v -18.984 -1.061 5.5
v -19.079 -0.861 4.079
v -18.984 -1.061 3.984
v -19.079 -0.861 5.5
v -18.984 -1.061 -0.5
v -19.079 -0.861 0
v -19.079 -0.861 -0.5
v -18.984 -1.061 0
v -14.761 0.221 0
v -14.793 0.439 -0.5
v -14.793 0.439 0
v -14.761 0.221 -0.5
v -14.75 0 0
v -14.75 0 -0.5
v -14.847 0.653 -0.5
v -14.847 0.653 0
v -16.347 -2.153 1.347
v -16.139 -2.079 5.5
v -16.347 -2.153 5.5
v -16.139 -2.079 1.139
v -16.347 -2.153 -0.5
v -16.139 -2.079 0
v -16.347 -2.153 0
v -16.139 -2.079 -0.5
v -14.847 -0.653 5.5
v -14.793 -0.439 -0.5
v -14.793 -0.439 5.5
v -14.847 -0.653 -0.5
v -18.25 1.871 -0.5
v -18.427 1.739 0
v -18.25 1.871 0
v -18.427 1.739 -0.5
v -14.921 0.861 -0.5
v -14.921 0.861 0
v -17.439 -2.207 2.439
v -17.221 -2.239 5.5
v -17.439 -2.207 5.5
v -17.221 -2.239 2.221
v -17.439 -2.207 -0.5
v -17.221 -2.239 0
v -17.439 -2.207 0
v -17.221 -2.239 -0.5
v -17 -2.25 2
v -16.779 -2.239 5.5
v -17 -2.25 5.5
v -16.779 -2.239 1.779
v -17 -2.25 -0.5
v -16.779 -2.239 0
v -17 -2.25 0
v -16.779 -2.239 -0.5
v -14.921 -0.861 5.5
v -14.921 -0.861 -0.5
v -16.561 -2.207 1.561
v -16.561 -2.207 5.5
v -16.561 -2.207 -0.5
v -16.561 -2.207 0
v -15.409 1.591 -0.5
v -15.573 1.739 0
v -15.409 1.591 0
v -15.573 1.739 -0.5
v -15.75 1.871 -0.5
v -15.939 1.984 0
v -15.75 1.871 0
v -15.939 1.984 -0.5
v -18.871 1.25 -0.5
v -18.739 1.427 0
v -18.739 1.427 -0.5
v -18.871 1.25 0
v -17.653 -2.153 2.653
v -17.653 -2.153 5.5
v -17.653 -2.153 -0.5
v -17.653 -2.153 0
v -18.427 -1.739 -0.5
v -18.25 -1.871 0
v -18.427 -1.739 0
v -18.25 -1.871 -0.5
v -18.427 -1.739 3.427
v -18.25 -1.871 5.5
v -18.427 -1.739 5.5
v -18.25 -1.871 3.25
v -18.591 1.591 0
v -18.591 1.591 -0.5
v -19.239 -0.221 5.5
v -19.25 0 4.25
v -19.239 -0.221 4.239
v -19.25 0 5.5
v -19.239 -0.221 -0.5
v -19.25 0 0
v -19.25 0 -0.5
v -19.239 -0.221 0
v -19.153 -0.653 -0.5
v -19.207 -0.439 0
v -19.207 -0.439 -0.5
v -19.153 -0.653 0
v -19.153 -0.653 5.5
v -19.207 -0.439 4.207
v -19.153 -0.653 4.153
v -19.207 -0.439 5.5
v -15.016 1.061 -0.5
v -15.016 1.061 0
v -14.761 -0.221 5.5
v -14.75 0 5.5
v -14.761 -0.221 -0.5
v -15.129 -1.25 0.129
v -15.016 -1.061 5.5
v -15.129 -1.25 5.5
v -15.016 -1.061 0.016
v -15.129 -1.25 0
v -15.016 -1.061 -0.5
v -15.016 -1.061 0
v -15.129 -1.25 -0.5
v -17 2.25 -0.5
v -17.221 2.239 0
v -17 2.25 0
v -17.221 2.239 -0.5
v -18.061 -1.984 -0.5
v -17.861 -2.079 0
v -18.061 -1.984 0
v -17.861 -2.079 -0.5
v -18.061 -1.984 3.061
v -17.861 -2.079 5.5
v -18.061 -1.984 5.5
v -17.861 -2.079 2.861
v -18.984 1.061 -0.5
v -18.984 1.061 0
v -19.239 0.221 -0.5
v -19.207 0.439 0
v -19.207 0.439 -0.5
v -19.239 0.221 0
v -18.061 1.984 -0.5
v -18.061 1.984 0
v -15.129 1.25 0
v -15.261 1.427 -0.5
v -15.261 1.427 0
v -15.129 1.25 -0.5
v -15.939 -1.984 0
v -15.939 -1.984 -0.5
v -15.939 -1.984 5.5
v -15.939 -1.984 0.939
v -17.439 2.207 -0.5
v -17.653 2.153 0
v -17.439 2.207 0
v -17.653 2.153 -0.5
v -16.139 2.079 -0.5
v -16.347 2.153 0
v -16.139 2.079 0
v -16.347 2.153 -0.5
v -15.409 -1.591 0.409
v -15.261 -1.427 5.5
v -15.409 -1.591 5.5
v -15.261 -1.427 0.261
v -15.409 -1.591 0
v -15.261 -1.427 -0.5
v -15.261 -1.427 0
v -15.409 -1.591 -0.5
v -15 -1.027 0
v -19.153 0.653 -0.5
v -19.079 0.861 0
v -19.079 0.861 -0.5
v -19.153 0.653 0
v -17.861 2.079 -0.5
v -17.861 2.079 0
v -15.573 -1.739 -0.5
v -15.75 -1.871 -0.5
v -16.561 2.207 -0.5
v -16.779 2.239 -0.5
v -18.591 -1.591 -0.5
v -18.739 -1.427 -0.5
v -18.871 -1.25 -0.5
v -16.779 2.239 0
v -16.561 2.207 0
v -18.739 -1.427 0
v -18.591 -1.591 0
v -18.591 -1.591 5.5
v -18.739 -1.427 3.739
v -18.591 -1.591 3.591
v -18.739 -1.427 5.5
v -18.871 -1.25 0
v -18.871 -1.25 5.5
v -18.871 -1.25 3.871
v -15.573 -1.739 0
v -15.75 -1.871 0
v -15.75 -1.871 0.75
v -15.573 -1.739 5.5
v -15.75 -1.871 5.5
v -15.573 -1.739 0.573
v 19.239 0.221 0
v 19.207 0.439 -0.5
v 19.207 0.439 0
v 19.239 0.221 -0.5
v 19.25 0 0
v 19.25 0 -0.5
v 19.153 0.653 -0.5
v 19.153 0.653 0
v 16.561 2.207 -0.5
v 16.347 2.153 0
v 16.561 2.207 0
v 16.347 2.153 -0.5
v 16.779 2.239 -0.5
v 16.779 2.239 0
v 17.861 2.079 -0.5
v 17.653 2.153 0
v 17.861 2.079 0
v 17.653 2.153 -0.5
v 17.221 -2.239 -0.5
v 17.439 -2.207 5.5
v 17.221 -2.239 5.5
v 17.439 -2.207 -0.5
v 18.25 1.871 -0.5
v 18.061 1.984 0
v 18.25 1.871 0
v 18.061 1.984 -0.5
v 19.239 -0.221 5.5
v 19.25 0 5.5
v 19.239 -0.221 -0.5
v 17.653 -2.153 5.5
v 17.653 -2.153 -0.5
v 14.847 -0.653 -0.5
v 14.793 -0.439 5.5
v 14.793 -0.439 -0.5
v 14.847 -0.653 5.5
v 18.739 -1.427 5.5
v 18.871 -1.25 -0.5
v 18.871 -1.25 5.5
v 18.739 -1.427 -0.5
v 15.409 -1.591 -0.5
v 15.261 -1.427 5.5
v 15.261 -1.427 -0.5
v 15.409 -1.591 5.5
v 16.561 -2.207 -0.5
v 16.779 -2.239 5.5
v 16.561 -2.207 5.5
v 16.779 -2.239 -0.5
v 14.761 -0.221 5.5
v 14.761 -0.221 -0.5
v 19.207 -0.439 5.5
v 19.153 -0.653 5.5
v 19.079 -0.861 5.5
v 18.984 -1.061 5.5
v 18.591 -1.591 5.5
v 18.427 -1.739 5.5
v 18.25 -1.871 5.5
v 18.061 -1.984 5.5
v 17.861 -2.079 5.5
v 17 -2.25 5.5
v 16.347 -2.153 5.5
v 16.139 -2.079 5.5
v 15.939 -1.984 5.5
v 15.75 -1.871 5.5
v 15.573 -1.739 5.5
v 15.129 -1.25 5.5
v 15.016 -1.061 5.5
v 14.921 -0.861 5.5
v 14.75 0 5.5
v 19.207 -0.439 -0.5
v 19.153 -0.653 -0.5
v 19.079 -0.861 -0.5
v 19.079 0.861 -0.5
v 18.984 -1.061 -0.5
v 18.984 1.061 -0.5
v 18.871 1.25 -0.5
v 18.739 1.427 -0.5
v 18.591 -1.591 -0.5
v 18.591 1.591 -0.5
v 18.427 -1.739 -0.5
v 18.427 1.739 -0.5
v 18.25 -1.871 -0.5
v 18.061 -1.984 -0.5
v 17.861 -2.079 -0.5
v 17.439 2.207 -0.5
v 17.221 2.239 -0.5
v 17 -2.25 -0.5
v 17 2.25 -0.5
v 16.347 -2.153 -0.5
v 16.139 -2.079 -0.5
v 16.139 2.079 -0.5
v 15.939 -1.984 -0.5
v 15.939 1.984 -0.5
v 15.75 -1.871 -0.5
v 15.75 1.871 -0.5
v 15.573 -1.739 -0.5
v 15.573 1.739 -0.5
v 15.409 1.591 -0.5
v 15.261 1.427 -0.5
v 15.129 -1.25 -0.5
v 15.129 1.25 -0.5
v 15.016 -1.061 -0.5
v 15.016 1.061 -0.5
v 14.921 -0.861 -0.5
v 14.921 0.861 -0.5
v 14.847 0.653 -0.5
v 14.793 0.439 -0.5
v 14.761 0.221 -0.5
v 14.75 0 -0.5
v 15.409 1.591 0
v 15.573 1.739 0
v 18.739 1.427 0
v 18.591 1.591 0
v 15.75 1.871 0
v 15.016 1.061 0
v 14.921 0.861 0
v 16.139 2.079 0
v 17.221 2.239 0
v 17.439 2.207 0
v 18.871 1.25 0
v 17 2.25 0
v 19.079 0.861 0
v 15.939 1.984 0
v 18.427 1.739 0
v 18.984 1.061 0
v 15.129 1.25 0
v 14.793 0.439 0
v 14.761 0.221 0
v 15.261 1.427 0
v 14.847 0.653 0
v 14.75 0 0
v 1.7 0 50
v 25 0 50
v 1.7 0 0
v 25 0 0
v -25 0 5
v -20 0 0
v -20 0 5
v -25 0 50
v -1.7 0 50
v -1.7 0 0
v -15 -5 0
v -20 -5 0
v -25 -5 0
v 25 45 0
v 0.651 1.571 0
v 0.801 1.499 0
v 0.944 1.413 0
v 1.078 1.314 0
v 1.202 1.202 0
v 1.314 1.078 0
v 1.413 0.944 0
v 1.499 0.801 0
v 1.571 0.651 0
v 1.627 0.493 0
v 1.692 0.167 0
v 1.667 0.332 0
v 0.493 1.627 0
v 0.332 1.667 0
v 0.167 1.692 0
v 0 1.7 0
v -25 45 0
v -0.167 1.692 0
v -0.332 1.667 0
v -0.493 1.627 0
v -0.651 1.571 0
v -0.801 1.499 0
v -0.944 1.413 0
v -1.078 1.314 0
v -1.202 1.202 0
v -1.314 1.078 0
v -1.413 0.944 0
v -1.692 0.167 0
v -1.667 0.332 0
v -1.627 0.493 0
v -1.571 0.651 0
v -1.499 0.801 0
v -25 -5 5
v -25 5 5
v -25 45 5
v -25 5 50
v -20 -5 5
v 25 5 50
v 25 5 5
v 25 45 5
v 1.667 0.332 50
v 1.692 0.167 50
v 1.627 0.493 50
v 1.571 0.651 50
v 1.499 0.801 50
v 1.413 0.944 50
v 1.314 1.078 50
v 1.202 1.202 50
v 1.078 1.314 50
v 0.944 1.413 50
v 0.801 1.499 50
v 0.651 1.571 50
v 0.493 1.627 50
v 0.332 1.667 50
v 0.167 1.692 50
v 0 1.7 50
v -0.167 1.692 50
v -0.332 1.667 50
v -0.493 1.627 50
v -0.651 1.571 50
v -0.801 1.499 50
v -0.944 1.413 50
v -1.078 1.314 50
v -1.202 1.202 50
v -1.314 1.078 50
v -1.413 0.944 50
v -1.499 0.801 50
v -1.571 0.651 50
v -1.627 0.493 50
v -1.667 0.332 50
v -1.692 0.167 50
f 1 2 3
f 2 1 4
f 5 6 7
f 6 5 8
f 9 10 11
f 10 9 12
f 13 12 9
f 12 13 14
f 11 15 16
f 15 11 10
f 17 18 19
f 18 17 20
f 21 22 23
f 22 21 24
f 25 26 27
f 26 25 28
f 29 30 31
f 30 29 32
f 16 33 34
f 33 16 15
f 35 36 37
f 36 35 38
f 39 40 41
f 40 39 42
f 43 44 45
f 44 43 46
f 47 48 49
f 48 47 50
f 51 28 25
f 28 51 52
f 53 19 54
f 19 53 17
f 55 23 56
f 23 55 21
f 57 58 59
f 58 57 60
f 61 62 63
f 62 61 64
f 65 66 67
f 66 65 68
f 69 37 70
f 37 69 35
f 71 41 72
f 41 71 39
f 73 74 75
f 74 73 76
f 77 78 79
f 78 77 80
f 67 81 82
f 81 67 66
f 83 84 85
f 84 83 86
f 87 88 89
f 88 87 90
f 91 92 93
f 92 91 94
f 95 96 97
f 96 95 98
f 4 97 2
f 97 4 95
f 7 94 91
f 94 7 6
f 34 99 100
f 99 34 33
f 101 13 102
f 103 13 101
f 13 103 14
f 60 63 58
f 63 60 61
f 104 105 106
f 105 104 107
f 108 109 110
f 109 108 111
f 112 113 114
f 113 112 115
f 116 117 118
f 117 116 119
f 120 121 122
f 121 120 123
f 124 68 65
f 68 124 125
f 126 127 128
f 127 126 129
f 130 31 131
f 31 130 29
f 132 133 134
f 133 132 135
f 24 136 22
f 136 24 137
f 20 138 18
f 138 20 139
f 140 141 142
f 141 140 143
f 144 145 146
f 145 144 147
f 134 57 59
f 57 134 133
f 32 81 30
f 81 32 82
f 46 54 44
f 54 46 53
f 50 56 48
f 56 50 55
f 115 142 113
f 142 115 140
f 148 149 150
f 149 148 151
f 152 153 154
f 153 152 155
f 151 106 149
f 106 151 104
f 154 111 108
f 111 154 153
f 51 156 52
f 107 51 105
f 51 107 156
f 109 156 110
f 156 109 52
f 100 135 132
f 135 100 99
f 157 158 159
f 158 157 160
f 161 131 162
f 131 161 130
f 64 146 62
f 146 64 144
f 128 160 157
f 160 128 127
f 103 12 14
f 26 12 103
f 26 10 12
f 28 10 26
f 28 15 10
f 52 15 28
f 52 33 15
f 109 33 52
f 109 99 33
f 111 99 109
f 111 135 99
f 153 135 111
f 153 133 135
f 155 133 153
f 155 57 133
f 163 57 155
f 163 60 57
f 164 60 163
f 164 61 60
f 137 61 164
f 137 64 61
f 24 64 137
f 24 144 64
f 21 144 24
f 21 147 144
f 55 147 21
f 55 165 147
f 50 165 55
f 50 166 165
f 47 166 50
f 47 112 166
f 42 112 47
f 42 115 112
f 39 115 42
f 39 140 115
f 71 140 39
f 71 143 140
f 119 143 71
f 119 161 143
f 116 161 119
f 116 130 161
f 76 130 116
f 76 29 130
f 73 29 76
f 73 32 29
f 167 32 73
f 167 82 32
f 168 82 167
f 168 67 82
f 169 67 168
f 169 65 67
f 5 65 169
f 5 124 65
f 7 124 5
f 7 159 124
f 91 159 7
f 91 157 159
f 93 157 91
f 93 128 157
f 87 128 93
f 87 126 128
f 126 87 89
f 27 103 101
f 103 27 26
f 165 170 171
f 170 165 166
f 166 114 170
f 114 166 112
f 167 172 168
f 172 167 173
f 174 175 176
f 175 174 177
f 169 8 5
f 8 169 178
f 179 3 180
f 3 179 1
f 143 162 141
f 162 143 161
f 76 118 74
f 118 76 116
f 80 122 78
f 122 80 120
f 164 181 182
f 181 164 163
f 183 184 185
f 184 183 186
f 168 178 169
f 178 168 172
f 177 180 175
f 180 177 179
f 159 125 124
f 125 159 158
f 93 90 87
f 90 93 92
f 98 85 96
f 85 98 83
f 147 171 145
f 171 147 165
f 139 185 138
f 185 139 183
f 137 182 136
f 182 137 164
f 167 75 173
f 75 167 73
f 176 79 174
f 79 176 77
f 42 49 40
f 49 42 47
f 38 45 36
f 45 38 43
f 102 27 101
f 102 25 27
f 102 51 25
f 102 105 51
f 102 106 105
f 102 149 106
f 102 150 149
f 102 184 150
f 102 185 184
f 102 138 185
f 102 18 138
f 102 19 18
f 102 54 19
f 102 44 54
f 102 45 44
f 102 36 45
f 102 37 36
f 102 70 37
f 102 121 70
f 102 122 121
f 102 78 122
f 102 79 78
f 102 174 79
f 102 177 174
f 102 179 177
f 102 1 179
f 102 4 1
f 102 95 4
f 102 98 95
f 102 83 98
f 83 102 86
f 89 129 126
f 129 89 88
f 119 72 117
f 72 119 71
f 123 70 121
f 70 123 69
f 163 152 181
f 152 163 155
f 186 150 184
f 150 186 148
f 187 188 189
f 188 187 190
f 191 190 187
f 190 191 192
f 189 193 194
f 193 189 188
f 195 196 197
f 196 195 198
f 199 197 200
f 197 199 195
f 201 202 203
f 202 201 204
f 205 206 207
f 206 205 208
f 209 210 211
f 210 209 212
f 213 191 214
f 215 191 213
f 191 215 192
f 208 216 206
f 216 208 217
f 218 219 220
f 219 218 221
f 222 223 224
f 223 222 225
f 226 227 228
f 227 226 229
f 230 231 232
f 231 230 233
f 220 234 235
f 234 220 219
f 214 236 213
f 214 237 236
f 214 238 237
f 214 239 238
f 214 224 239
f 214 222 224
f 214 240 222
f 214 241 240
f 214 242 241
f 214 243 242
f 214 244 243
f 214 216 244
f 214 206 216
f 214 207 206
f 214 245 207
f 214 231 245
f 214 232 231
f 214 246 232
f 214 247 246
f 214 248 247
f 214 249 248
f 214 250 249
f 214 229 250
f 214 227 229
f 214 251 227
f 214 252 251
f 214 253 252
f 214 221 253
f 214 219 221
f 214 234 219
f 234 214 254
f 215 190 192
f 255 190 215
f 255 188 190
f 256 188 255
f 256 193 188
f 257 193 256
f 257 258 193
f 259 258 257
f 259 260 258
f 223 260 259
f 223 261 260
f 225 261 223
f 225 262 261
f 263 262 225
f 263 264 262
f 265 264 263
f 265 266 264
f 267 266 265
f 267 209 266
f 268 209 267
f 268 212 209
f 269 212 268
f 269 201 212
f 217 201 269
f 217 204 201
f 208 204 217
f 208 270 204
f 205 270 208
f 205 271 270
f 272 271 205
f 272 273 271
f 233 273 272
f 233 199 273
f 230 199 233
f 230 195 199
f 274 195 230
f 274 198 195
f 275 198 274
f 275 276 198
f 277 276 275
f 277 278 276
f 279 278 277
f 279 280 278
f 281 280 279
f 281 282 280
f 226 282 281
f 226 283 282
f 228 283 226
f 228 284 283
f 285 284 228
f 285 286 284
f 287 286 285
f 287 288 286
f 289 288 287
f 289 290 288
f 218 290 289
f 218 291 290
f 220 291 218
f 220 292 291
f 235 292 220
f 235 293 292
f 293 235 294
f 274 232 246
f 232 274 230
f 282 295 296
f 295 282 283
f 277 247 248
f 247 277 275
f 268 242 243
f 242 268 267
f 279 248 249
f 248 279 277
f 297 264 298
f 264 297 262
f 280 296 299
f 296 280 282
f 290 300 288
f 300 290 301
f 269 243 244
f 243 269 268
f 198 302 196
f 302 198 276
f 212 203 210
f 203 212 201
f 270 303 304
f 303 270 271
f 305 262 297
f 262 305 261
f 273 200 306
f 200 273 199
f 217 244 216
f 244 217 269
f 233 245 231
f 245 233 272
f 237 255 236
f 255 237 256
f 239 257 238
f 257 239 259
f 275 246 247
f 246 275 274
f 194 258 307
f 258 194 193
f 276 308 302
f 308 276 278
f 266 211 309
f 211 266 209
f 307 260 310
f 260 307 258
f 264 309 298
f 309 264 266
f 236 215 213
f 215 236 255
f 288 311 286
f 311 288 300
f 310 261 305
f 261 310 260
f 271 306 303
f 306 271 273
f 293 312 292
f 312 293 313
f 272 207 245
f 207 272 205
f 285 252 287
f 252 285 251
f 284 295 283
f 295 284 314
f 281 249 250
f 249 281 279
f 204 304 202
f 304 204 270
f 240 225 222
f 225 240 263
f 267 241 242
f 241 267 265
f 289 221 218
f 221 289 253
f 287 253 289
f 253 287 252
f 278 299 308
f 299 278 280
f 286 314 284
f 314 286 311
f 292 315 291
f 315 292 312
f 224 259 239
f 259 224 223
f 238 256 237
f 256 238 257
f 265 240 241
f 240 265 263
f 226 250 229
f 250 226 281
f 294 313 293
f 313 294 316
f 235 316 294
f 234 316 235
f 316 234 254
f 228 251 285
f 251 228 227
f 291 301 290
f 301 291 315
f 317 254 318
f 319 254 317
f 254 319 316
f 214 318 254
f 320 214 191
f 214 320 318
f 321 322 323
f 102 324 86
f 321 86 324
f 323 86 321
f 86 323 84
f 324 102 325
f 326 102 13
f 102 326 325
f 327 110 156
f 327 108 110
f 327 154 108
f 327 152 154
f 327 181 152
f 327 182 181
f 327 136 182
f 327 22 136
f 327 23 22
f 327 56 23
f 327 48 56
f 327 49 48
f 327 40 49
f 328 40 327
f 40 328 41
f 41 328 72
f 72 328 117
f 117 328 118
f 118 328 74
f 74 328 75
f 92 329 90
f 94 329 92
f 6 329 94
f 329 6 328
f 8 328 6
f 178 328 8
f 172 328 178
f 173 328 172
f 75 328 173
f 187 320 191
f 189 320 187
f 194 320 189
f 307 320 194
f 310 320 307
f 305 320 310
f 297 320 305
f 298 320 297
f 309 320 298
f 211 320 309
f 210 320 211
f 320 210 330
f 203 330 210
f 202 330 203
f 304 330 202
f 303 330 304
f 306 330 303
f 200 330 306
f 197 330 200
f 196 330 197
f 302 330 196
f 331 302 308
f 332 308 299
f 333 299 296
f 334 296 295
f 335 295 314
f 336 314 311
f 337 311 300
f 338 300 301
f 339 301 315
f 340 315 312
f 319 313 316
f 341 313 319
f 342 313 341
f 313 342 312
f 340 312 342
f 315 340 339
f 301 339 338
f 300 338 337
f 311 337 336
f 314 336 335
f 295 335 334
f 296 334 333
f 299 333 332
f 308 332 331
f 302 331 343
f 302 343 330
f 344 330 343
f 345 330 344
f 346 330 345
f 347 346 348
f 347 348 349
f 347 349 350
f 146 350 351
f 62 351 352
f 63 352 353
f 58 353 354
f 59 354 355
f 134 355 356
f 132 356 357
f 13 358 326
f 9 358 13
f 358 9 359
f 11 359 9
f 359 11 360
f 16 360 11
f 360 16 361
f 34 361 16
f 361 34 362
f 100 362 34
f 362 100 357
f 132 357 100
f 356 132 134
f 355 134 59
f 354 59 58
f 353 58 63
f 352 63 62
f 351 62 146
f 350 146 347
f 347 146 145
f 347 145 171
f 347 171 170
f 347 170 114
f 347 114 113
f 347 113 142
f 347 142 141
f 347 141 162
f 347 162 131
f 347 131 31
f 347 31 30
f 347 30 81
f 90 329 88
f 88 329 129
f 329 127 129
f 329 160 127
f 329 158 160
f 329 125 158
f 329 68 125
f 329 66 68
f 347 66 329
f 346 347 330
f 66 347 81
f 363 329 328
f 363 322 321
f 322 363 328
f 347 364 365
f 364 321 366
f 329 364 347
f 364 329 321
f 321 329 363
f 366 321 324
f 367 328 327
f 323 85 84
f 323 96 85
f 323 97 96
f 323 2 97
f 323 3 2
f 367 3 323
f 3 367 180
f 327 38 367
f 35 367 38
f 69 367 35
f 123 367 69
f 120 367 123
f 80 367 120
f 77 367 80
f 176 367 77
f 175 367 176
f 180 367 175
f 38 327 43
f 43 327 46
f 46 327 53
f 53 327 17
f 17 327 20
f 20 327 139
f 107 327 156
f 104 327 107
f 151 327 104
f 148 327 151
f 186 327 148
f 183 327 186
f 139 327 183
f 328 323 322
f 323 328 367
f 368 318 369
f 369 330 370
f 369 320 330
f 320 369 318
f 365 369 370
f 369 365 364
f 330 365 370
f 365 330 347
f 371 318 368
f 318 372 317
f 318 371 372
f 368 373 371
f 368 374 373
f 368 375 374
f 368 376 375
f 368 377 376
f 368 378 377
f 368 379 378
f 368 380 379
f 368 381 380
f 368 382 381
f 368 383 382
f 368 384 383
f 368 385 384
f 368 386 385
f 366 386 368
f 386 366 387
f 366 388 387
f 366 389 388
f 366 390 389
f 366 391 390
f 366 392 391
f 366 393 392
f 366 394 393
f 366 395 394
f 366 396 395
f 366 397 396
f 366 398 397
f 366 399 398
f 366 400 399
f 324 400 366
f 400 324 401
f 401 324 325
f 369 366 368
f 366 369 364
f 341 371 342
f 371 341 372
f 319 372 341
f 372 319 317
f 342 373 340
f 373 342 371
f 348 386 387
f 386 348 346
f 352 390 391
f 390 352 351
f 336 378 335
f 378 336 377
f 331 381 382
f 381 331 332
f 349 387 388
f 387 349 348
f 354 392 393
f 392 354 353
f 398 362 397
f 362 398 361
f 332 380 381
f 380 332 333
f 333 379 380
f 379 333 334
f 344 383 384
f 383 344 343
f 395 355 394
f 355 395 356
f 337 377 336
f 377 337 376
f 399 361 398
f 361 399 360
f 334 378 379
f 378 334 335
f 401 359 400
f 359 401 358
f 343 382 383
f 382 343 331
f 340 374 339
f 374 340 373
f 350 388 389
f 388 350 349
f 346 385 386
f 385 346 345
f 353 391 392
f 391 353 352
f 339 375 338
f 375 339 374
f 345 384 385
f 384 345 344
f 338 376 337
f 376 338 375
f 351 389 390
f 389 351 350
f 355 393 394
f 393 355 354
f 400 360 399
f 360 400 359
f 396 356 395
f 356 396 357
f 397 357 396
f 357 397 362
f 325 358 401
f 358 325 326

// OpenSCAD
// L-shaped mounting bracket for NEMA 17 stepper motor (e.g. syringe pump)
// Print orientation: base plate on bed, motor plate building up in +Z

$fn = 64;

// ---- Base plate ----
base_x_min = -25;   // base plate X start
base_x_max = 25;    // base plate X end
base_y_min = 0;     // base plate Y start
base_y_max = 45;    // base plate Y end
base_z_max = 5;     // base plate thickness

// ---- Motor plate ----
motor_x_min = -25;  // motor plate X start
motor_x_max = 25;  // motor plate X end
motor_y_min = 0;   // motor plate Y start
motor_y_max = 5;   // motor plate Y end (on back edge of base)
motor_z_max = 50;  // motor plate height

// ---- Boss hole ----
boss_d = 23;        // motor boss hole diameter
boss_x = 0;         // boss hole X centre
boss_z = 28;        // boss hole Z centre

// ---- Screw holes ----
screw_d = 3.4;      // M3 screw hole diameter
screw_pattern = 31; // square pattern side length

// ---- Gussets ----
gusset_x_min = -25; // left gusset X start
gusset_x_max = -20; // left gusset X end
gusset_y_max = 5;   // gusset leg along Y
gusset_z_max = 5;   // gusset leg along Z
gusset_t = 5;       // gusset thickness (X direction)

// ---- Cutting overlap ----
eps = 0.5;          // extension past cut faces

difference() {
    union() {
        // Base plate with two vertical through-holes (M4)
        translate([base_x_min, base_y_min, 0])
            cube([base_x_max - base_x_min, base_y_max - base_y_min, base_z_max]);
        for (sx = [-17, 17])
            translate([sx, base_y_min, -eps])
                cylinder(d = 4.5, h = base_z_max + 2 * eps);

        // Vertical motor plate standing on back edge of base
        translate([motor_x_min, motor_y_min, 0])
            cube([motor_x_max - motor_x_min, motor_y_max - motor_y_min, motor_z_max]);

        // Triangular gussets flush with left and right edges
        for (sx = [gusset_x_min, gusset_x_max])
            translate([sx, 0, 0])
                rotate([90, 0, 0])
                    linear_extrude(height = gusset_t)
                        polygon(points = [[0, 0], [gusset_y_max, 0], [0, gusset_z_max]]);
    }

    // Boss hole through motor plate along Y
    translate([boss_x, motor_y_min - eps, boss_z])
        rotate([90, 0, 0])
            cylinder(d = boss_d, h = motor_y_max - motor_y_min + 2 * eps);

    // Four M3 screw holes on 31 mm square pattern centred on boss hole
    for (a = [0, 90, 180, 270])
        rotate([0, 0, a])
            translate([0, 0, -eps])
                cylinder(d = screw_d, h = motor_z_max + 2 * eps);
}
